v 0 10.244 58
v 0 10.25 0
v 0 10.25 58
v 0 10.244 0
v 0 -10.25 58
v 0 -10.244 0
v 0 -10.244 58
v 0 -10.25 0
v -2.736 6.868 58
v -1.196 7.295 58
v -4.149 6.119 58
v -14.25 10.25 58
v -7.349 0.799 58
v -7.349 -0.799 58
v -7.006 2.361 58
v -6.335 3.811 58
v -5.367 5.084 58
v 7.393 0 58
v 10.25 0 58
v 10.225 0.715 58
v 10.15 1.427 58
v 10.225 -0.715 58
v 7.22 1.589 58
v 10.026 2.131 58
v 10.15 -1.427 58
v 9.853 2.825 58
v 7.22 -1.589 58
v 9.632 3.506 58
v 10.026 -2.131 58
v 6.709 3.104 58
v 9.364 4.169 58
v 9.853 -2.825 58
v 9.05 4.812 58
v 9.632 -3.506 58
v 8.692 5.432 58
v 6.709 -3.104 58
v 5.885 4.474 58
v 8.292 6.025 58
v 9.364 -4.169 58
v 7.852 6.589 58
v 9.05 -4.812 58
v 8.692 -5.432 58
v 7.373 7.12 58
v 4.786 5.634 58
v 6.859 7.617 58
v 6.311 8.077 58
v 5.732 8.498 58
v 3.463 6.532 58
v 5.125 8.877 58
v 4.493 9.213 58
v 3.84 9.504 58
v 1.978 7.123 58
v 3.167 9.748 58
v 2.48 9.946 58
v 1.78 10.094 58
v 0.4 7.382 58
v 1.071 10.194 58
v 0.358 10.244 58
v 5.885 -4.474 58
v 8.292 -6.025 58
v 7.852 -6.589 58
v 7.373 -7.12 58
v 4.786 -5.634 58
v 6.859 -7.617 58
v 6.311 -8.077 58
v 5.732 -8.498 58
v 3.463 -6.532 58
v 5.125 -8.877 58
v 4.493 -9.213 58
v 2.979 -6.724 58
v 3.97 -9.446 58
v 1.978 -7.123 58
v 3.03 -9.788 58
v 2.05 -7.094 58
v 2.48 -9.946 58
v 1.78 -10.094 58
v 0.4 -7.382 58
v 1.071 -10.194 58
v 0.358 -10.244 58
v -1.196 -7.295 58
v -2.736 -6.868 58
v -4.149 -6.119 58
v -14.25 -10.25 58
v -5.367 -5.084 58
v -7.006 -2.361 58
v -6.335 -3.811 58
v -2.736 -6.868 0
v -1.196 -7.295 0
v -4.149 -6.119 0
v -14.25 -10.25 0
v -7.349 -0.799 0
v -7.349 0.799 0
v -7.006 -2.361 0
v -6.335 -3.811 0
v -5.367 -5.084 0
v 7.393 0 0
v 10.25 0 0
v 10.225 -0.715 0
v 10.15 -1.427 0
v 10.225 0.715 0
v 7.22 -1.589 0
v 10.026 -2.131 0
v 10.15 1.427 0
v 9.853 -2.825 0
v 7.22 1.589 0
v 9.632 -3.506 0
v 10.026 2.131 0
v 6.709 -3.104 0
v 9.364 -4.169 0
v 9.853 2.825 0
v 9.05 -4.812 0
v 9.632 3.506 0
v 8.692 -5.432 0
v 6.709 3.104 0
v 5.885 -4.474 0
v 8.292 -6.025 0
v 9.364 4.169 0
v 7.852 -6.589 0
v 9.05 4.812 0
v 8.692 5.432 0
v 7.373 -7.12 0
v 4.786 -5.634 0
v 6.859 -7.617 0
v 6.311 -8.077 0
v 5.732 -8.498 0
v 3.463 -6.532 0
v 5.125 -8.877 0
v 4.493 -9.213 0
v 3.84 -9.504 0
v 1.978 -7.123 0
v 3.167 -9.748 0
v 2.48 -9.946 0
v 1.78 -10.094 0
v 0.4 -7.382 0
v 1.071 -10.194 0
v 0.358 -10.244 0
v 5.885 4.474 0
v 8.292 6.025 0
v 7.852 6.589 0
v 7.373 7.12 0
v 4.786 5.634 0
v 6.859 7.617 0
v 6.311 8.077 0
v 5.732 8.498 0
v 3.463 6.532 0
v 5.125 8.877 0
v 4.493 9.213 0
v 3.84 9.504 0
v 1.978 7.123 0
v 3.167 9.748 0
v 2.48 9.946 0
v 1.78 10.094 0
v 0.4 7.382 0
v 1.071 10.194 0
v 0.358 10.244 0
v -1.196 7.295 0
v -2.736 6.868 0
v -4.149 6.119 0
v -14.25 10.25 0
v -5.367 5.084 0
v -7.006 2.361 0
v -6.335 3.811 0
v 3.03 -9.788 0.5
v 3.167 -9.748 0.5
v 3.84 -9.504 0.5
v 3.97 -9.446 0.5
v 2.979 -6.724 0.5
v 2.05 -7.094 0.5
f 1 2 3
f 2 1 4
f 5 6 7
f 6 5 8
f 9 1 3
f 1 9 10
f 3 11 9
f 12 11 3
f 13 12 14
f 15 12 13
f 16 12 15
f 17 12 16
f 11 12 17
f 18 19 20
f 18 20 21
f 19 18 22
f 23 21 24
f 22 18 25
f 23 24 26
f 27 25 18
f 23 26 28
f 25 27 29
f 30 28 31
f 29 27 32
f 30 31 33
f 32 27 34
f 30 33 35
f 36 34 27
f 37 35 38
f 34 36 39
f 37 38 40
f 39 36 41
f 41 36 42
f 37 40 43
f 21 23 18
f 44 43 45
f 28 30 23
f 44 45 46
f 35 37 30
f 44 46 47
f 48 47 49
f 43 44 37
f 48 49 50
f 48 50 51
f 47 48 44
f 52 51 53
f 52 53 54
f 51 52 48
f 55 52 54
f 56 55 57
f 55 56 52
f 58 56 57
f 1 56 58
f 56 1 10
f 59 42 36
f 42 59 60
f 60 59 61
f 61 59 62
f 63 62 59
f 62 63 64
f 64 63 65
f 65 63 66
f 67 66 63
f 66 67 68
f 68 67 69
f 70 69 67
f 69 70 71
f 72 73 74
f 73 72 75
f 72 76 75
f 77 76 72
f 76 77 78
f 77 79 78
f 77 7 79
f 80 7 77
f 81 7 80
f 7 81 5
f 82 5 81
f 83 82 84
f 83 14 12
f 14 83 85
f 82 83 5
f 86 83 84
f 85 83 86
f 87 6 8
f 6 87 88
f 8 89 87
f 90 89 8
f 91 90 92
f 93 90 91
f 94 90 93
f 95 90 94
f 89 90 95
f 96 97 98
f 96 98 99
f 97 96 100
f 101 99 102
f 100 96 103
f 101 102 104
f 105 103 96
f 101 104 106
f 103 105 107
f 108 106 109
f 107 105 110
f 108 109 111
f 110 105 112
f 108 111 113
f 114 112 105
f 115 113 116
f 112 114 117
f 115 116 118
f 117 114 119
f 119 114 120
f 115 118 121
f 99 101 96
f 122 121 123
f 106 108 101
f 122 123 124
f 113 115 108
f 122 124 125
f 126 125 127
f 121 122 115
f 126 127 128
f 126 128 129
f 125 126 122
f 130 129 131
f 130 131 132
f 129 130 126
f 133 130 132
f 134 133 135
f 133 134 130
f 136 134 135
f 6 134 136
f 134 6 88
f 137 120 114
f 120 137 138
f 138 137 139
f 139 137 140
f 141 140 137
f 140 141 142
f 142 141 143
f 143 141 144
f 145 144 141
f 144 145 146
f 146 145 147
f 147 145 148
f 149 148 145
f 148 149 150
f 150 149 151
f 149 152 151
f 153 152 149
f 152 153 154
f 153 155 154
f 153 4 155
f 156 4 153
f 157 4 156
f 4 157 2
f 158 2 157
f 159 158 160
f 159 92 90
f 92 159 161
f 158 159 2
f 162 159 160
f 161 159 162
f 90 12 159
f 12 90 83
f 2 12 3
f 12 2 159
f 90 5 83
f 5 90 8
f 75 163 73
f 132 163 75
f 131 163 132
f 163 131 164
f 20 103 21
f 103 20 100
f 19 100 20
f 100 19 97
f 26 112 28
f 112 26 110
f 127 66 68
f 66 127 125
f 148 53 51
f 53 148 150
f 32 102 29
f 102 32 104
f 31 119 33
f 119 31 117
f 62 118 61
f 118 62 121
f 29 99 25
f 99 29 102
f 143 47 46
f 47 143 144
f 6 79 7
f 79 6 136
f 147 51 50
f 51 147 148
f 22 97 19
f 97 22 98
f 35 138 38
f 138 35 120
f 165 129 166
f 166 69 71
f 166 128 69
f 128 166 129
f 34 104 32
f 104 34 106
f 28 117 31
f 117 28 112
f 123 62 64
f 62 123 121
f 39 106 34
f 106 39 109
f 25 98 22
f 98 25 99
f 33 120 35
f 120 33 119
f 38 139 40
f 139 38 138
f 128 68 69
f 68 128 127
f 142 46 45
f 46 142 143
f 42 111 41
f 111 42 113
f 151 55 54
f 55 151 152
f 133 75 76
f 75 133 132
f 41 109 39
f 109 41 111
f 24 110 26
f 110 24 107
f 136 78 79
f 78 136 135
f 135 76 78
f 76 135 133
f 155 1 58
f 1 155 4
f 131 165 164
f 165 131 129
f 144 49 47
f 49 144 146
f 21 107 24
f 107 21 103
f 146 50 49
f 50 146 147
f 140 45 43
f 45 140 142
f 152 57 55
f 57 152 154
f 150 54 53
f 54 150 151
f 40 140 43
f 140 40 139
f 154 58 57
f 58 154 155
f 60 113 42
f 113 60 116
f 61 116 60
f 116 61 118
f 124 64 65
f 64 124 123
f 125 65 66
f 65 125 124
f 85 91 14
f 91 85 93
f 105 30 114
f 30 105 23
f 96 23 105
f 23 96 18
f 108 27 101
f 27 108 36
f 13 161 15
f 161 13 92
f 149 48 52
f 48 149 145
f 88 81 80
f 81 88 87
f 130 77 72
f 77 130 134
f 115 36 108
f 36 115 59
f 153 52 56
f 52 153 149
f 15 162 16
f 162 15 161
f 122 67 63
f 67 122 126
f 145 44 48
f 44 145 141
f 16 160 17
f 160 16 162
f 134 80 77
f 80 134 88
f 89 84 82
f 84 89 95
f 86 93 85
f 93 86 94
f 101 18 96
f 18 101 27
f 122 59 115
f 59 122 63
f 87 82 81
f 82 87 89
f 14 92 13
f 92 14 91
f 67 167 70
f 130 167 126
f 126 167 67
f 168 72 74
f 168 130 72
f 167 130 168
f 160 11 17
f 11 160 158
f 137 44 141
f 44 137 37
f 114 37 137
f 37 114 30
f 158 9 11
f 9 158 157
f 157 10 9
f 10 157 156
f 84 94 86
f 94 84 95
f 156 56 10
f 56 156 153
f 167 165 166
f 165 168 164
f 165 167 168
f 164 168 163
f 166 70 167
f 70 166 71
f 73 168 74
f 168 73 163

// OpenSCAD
// file: polyholes.scad
//
// Mendel90
//
// GNU GPL v2
// nop.head@gmail.com
// hydraraptor.blogspot.com
//
// See http://hydraraptor.blogspot.com/2011/02/polyholes.html
//
function sides(r) = max(round(4 *r),3);
function correctedRadius(r,n) = 0.1 + r / cos(180 / n);
function correctedDiameter(d) = 0.2 + d / cos(180 / sides(d / 2));

module polyCircle(r, center = false) {
    n = sides(r);
    circle(r = correctedRadius(r,n), $fn = n, center = center);
}

module poly_circle(r, center = false) {
	polyCircle(r, center);
}

module polyCylinder(r, h, center = false) {
    n = sides(r);
    cylinder(h = h, r = correctedRadius(r,n), $fn = n, center = center);
}

module poly_cylinder(r, h, center = false) {
	polyCylinder(r,h,center);
}

module polydCylinder(r, center = false) {
    n = sides(r);
    r = correctedRadius(r,n);
    cylinder(h = h, r = r, $fn = n, center = center);
    translate([0, -r, 0])
        cube([r, 2 * r, h]);
}

module poly_d_cylinder(r, center = false) {
	polydCylinder(r,center);
}
// main file
// PRUSA iteration3
// Bearing holders
// GNU GPL v3
// Josef Průša <iam@josefprusa.cz> and contributors
// http://www.reprap.org/wiki/Prusa_Mendel
// http://prusamendel.org

use <polyholes.scad>

bearing_diameter = 14.5;

module horizontal_bearing_base(bearings=1){
 translate(v=[0,0,6]) cube(size = [24,8+bearings*25,12], center = true);	
}
module horizontal_bearing_holes(bearings=1){
 cutter_lenght = 10+bearings*25;
 one_holder_lenght = 8+25;
 holder_lenght = 8+bearings*25;
 
 // Main bearing cut
 difference(){
  translate(v=[0,0,12]) rotate(a=[90,0,0]) translate(v=[0,0,-cutter_lenght/2]) cylinder(h = cutter_lenght, r=bearing_diameter/2, $fn=50);
  // Bearing retainers
  translate(v=[0,1-holder_lenght/2,3]) cube(size = [24,6,8], center = true);
  translate(v=[0,-1+holder_lenght/2,3]) cube(size = [24,6,8], center = true);
 }
 
 // Ziptie cutouts
 ziptie_cut_ofset = 0;
 for ( i = [0 : bearings-1] ){
  // For easier positioning I move them by half of one 
  // bearing holder then add each bearign lenght and then center again
  translate(v=[0,-holder_lenght/2,0]) translate(v=[0,one_holder_lenght/2+i*25,0]) difference(){
   union(){
    translate(v=[0,2-6,12]) rotate(a=[90,0,0]) translate(v=[0,0,0]) cylinder(h = 4, r=11.5, $fn=50);
    translate(v=[0,2+6,12]) rotate(a=[90,0,0]) translate(v=[0,0,0]) cylinder(h = 4, r=11.5, $fn=50);
   }
   translate(v=[0,10,12]) rotate(a=[90,0,0]) translate(v=[0,0,0]) cylinder(h = 24, r=9, $fn=50);
  }
 }
 
}

module horizontal_bearing_test(){
 difference(){
  horizontal_bearing_base(1);
  horizontal_bearing_holes(1);
 }
 translate(v=[30,0,0]) difference(){
  horizontal_bearing_base(2);
  #horizontal_bearing_holes(2);
 }
 translate(v=[60,0,0]) difference(){
  horizontal_bearing_base(3);
  horizontal_bearing_holes(3);
 }
}



thinwall = 3;
bearing_size = bearing_diameter + 2 * thinwall;

module vertical_bearing_base(){
 translate(v=[-2-bearing_size/4,0,29]) cube(size = [4+bearing_size/2,bearing_size,58], center = true);
 cylinder(h = 58, r=bearing_size/2, $fn = 90);
}

module vertical_bearing_holes(){
  translate(v=[0,0,-1]) poly_cylinder(h = 62, r=bearing_diameter/2);
  rotate(a=[0,0,-70]) translate(v=[bearing_diameter/2-2.9,-0.5,0.5]) cube(size = [thinwall*2,1,62]);

}

difference(){
vertical_bearing_base();
vertical_bearing_holes();
}
//horizontal_bearing_test();
